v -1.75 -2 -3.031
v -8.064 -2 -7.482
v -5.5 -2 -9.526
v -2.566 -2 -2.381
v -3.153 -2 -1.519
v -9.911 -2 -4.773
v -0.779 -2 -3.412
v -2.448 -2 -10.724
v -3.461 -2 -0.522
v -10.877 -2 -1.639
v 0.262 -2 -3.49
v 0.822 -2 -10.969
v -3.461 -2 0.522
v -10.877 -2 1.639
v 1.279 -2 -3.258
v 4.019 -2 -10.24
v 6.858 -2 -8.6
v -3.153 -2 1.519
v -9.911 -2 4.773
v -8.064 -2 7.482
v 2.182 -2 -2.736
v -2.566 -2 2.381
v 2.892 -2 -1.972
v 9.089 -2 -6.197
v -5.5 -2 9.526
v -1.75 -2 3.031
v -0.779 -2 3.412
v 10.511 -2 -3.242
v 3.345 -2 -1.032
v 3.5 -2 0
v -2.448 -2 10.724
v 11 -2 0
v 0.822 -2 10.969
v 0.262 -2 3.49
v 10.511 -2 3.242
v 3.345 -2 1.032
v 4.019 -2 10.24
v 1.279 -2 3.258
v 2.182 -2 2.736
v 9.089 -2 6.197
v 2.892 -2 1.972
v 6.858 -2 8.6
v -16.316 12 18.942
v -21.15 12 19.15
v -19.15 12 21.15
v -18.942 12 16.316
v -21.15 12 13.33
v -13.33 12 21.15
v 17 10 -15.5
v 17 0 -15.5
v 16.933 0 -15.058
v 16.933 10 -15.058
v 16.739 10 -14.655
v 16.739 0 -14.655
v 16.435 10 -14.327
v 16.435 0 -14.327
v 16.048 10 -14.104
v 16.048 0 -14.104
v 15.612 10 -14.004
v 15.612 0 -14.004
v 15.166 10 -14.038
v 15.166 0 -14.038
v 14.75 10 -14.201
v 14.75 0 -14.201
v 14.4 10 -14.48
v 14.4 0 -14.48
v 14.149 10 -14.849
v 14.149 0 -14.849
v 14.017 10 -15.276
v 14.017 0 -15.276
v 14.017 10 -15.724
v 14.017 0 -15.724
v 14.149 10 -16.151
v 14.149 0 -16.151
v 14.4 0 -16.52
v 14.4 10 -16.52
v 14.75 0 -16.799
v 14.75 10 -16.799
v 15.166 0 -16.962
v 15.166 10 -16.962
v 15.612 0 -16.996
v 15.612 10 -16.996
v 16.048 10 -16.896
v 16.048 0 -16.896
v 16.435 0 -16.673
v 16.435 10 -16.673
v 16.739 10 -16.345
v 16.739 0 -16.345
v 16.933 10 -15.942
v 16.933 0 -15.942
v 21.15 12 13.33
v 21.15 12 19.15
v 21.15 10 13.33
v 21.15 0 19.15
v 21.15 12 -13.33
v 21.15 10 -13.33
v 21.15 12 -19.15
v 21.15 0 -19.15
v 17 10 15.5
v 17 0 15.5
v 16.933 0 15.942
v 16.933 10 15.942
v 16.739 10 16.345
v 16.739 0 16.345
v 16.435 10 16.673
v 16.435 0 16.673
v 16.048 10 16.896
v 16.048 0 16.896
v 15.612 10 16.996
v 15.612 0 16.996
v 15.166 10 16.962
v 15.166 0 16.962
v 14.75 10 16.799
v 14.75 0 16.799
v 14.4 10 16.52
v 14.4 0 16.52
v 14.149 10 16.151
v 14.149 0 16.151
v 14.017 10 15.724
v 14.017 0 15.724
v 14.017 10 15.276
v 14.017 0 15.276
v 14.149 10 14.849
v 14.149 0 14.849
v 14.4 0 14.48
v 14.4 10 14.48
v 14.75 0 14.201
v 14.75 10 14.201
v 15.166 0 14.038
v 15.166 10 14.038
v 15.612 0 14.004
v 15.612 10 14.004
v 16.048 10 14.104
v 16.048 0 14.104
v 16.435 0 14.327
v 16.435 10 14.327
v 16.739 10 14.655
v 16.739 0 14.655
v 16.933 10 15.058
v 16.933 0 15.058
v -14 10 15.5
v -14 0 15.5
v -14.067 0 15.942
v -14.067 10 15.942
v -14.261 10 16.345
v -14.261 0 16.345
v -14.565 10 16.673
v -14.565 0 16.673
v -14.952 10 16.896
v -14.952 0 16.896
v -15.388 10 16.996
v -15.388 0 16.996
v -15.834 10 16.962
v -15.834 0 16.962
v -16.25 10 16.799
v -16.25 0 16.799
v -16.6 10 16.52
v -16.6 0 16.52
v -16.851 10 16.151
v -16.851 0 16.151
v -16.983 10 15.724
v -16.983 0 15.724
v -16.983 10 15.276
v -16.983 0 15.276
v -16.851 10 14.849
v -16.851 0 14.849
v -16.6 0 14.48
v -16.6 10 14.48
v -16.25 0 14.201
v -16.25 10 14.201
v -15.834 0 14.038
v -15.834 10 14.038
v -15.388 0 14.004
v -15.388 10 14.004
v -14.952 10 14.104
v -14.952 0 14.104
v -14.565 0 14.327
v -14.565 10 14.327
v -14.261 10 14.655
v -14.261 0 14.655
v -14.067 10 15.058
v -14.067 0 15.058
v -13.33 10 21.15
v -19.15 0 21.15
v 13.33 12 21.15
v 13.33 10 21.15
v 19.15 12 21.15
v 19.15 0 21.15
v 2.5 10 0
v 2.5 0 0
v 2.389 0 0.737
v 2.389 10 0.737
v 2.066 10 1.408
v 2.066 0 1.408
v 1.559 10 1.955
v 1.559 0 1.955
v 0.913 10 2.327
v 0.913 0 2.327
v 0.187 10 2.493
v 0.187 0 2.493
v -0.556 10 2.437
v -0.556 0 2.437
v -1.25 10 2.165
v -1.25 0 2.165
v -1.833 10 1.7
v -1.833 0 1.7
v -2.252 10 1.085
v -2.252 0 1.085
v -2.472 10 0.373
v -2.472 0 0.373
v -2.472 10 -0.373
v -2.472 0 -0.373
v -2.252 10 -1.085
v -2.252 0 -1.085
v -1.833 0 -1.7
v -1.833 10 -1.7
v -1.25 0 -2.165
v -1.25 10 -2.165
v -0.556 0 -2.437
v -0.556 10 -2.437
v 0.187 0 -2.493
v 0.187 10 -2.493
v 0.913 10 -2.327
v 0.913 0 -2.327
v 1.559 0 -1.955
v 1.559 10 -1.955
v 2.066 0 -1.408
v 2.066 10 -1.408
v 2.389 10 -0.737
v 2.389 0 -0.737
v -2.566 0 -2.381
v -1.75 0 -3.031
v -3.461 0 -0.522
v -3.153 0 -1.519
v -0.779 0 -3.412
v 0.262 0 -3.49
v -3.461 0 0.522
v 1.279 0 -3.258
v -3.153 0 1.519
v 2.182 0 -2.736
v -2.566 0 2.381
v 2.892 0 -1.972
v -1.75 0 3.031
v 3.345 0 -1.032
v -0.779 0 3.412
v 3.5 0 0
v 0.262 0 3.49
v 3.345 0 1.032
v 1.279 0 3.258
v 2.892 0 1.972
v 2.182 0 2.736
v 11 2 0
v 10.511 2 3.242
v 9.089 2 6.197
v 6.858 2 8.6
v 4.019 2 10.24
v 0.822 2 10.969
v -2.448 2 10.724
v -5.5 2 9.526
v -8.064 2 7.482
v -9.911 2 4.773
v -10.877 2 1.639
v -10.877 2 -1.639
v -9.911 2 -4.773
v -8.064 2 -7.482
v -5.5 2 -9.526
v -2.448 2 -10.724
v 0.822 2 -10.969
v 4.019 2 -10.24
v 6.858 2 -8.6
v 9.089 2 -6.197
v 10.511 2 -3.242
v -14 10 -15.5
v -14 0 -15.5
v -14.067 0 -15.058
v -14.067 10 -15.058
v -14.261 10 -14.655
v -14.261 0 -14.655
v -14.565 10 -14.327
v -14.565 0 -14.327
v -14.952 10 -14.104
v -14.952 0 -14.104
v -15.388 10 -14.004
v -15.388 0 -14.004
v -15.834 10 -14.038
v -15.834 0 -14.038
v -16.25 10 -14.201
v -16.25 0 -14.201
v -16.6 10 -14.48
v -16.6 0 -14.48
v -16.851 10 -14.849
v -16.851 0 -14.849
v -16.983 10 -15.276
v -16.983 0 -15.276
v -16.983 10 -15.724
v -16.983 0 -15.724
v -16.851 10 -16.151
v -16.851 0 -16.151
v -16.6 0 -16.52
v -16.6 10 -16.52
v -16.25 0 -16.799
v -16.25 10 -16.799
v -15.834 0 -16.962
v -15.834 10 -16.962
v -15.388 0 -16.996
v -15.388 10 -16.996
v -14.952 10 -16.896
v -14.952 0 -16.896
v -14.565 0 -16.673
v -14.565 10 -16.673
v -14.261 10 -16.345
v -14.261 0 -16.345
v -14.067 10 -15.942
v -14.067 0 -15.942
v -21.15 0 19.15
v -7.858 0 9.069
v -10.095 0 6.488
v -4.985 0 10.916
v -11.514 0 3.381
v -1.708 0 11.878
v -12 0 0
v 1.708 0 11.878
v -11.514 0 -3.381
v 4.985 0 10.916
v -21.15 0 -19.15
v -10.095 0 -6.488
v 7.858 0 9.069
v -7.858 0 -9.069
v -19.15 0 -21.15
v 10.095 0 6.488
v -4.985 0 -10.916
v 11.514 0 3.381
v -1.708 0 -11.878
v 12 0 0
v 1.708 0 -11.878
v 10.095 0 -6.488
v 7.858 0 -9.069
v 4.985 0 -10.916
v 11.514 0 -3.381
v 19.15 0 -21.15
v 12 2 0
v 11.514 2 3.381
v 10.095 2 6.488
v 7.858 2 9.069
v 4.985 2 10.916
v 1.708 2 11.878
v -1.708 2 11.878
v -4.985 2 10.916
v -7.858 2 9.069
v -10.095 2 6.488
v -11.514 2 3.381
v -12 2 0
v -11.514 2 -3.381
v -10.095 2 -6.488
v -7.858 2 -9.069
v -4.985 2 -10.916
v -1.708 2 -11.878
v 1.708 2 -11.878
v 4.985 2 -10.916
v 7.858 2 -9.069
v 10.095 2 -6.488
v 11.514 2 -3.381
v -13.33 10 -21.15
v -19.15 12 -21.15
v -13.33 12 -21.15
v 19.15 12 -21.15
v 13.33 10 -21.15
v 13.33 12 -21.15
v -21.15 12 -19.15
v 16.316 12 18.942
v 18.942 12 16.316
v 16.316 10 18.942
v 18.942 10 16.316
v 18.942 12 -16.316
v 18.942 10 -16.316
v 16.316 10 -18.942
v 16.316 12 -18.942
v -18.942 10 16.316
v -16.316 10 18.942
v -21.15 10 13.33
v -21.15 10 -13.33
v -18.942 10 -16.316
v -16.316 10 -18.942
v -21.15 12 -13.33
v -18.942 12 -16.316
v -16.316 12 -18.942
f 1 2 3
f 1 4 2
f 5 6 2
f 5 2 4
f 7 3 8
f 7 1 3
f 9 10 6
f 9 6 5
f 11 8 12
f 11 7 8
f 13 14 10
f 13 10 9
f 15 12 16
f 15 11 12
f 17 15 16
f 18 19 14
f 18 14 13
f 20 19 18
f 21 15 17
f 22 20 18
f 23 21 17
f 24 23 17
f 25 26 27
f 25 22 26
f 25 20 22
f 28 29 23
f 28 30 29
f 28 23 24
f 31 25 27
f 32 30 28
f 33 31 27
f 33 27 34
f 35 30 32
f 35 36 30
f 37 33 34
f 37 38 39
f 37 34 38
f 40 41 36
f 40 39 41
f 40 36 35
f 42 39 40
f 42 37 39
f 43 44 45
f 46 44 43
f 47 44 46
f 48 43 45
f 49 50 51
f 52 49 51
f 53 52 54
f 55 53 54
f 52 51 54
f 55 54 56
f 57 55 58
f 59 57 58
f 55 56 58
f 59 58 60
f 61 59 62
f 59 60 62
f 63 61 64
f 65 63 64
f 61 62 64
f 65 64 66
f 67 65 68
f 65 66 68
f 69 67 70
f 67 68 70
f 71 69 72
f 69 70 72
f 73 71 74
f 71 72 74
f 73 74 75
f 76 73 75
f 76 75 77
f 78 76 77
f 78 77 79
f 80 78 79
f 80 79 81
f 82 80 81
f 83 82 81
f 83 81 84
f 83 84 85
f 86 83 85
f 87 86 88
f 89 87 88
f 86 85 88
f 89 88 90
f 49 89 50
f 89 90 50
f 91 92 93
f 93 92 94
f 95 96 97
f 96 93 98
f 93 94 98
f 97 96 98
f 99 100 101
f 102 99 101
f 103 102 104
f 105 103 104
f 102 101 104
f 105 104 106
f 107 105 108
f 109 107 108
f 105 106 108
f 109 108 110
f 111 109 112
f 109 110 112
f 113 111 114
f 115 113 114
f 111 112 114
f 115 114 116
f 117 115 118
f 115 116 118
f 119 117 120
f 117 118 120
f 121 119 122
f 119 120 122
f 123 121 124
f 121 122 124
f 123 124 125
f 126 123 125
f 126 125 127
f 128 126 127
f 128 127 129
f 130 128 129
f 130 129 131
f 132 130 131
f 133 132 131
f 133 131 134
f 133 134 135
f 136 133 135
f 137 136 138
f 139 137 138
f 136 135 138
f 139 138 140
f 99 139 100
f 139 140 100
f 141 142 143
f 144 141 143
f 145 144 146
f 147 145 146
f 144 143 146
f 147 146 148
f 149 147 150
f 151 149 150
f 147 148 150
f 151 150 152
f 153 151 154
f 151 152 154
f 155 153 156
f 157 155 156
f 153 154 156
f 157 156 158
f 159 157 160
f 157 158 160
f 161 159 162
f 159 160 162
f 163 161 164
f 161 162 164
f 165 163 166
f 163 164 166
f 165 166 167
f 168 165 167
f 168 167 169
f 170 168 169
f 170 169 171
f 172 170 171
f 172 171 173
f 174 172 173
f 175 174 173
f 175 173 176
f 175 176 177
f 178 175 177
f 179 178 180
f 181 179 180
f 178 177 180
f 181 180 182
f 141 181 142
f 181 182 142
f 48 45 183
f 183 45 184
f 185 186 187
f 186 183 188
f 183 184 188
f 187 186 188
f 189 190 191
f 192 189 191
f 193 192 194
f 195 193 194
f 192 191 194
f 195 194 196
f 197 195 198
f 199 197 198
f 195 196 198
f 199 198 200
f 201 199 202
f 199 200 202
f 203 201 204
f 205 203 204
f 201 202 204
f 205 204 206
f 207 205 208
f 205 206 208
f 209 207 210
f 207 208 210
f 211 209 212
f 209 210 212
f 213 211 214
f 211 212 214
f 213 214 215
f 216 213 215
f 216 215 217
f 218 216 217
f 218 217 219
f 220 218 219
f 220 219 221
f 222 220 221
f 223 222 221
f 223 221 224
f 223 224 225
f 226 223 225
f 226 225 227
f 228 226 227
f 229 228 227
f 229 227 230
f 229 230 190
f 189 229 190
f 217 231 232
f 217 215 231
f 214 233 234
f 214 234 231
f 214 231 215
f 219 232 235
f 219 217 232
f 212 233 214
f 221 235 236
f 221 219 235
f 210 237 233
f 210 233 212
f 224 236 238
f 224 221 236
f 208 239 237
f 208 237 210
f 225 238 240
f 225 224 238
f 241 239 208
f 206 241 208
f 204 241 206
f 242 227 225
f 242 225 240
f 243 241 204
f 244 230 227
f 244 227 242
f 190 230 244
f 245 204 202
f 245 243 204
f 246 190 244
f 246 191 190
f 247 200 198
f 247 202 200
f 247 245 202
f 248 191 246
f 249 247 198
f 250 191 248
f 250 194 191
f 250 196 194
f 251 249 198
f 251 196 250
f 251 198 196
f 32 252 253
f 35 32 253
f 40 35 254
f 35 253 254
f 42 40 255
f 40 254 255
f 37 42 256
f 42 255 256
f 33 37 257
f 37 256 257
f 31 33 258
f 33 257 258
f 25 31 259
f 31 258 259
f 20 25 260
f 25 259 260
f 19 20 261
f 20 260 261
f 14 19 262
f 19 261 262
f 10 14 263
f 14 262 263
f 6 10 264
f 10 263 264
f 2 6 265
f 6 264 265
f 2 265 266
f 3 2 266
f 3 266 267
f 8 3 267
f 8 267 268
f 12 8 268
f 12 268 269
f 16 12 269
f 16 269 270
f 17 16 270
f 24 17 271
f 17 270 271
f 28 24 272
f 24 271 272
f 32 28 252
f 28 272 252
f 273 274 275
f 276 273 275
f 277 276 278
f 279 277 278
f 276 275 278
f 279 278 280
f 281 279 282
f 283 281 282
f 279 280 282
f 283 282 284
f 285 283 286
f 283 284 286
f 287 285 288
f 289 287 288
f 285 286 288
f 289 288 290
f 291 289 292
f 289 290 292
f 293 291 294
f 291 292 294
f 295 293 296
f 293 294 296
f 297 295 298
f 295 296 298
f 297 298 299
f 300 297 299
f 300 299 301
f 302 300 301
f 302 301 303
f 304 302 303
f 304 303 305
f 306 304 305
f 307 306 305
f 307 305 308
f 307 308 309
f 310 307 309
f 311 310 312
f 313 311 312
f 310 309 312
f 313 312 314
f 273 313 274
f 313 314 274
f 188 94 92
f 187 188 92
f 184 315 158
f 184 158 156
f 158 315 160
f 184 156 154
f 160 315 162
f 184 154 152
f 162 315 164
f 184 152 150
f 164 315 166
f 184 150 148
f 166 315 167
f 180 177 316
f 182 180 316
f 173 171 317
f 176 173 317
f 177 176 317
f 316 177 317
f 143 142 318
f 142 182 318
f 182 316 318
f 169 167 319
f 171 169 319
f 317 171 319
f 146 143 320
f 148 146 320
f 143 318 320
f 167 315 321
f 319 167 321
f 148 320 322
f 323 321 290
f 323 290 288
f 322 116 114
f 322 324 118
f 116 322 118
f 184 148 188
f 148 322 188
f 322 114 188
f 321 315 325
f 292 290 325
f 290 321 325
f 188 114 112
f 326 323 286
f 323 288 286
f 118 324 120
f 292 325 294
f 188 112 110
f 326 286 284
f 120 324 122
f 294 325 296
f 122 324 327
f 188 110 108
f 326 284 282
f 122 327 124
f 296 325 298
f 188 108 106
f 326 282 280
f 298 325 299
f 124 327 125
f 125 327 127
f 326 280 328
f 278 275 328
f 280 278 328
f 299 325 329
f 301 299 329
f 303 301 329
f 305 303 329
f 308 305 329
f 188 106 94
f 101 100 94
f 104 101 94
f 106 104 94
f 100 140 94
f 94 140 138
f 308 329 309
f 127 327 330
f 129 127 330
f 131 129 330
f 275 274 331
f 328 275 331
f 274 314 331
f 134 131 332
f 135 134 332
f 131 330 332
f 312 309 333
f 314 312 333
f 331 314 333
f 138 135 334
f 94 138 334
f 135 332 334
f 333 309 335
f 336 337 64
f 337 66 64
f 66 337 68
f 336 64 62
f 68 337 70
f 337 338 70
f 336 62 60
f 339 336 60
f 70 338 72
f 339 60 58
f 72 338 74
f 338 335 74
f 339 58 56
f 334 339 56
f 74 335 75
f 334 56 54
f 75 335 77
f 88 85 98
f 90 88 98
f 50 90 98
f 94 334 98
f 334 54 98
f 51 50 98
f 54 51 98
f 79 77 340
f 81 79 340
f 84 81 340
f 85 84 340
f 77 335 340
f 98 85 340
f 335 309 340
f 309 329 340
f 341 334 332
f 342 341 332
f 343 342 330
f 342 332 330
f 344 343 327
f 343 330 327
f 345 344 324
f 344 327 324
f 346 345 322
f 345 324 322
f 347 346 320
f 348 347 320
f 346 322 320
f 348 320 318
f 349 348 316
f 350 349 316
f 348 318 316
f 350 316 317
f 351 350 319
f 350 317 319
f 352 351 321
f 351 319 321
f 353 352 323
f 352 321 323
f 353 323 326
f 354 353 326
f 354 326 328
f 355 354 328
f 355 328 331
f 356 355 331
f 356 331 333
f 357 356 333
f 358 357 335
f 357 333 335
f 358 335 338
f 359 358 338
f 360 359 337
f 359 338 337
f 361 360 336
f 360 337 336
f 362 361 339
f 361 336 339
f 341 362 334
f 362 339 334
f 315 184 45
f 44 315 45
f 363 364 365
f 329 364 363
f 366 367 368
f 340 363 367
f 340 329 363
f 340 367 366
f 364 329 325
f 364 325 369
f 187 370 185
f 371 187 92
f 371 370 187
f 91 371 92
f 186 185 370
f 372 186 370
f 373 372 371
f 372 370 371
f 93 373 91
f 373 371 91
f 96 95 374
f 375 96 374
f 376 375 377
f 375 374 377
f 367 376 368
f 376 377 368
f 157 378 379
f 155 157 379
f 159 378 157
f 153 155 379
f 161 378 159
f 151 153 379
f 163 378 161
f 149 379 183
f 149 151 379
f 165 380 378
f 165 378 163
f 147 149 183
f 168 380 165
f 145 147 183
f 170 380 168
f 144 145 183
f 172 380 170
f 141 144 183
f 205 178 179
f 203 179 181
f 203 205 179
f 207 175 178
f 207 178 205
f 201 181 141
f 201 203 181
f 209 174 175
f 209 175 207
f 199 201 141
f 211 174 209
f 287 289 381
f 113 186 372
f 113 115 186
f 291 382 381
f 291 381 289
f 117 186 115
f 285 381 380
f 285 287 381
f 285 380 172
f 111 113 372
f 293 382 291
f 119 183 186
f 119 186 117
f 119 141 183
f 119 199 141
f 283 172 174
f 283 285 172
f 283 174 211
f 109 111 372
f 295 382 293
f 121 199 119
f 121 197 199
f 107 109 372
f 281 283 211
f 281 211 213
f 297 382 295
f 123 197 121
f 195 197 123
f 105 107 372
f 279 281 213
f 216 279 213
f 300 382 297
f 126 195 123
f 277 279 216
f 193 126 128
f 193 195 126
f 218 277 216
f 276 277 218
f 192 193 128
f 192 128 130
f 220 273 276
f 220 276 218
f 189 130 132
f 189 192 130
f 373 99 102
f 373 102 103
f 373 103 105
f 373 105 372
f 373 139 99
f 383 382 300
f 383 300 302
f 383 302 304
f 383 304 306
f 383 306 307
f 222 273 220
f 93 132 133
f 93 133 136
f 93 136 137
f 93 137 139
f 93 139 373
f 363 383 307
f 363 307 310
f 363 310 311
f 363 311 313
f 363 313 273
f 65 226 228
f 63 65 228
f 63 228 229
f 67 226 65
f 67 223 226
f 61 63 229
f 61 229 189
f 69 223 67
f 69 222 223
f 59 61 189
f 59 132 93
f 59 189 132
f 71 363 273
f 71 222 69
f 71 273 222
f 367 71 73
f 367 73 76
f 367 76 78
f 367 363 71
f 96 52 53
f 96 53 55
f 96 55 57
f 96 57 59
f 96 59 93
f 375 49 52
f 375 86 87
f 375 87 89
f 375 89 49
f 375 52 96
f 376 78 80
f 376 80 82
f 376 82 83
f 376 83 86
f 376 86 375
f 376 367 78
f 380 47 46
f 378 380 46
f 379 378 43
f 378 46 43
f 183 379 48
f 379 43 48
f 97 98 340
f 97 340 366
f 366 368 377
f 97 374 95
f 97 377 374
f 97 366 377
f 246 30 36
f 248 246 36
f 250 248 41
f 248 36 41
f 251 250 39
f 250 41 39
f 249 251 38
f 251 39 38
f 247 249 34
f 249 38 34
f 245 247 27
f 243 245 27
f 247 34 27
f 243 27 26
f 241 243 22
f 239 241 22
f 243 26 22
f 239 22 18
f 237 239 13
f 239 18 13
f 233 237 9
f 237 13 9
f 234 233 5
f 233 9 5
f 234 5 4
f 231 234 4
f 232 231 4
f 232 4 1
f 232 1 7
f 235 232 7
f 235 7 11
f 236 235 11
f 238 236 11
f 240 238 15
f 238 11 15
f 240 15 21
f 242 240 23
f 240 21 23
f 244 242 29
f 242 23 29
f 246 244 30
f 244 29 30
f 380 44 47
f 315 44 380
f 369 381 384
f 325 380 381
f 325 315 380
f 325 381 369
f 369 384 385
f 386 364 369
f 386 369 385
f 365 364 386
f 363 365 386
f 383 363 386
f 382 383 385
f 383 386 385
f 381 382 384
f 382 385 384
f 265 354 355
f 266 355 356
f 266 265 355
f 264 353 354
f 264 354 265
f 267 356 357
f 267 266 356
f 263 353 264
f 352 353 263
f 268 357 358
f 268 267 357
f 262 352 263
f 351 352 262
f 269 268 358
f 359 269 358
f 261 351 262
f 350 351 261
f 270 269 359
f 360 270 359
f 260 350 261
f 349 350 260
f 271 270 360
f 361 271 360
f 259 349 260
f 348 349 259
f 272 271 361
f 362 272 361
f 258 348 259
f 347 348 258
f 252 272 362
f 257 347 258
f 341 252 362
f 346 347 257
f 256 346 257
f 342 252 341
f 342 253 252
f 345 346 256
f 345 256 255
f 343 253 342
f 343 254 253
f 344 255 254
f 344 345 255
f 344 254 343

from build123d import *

# Parameters (mm, degrees)
CROQUIS1_W              = 42.3
CROQUIS1_H              = 42.3
SALIENTE_EXTRUIR1_DEPTH = 12
CORTAR_EXTRUIR1_DEPTH   = 2
CHAFL_N1_SIZE           = 2
CROQUIS3_R              = 1.5
CORTAR_EXTRUIR2_DEPTH   = 10
CROQUIS4_R              = 12
CORTAR_EXTRUIR3_DEPTH   = 2
CROQUIS5_R              = 11
SALIENTE_EXTRUIR2_DEPTH = 4
CROQUIS6_R              = 3.5
CORTAR_EXTRUIR5_DEPTH   = 2
CROQUIS7_R              = 2.5
CORTAR_EXTRUIR6_DEPTH   = 13


with BuildPart() as part:
    # Croquis1 → Saliente-Extruir1 (new body)
    with BuildSketch(Plane(origin=(0, 0, 0), x_dir=(1, 0, 0), z_dir=(0, 1, 0))):
        Rectangle(CROQUIS1_W, CROQUIS1_H)
    extrude(amount=SALIENTE_EXTRUIR1_DEPTH)

    # Croquis2 → Cortar-Extruir1 (cut)
    with BuildSketch(Plane(origin=(0, 12, 0), x_dir=(1, 0, 0), z_dir=(0, 1, 0))):
        with BuildLine():
            Line((-21.15, 13.329572386), (-21.15, -13.329572386))
            ThreePointArc((-21.15, -13.329572386), (-17.67766953, -17.67766953), (-13.329572386, -21.15))
            Line((-13.329572386, -21.15), (13.329572386, -21.15))
            ThreePointArc((13.329572386, -21.15), (17.67766953, -17.67766953), (21.15, -13.329572386))
            Line((21.15, -13.329572386), (21.15, 13.329572386))
            ThreePointArc((21.15, 13.329572386), (17.67766953, 17.67766953), (13.329572386, 21.15))
            Line((13.329572386, 21.15), (-13.329572386, 21.15))
            ThreePointArc((-13.329572386, 21.15), (-17.67766953, 17.67766953), (-21.15, 13.329572386))
        make_face()
    extrude(amount=-CORTAR_EXTRUIR1_DEPTH, mode=Mode.SUBTRACT)

    # Chaflán1
    chafl_n1_edges = [part.edges().sort_by_distance(p)[0] for p in [
        (21.15, 6, 21.15),
        (-21.15, 6, 21.15),
        (-21.15, 6, -21.15),
        (21.15, 6, -21.15),
    ]]
    chamfer(chafl_n1_edges, length=CHAFL_N1_SIZE)

    # Croquis3 → Cortar-Extruir2 (cut)
    with BuildSketch(Plane.XZ):
        with Locations((-15.5, 15.5)):
            Circle(CROQUIS3_R)
        with Locations((-15.5, -15.5)):
            Circle(CROQUIS3_R)
        with Locations((15.5, -15.5)):
            Circle(CROQUIS3_R)
        with Locations((15.5, 15.5)):
            Circle(CROQUIS3_R)
    extrude(amount=-CORTAR_EXTRUIR2_DEPTH, mode=Mode.SUBTRACT)

    # Croquis4 → Cortar-Extruir3 (cut)
    with BuildSketch(Plane.XZ):
        Circle(CROQUIS4_R)
    extrude(amount=-CORTAR_EXTRUIR3_DEPTH, mode=Mode.SUBTRACT)

    # Croquis5 → Saliente-Extruir2 (add)
    with BuildSketch(Plane.XZ.offset(-2)):
        Circle(CROQUIS5_R)
    extrude(amount=SALIENTE_EXTRUIR2_DEPTH)

    # Croquis6 → Cortar-Extruir5 (cut)
    with BuildSketch(Plane.XZ.offset(2)):
        Circle(CROQUIS6_R)
    extrude(amount=-CORTAR_EXTRUIR5_DEPTH, mode=Mode.SUBTRACT)

    # Croquis7 → Cortar-Extruir6 (cut, through all)
    with BuildSketch(Plane.XZ):
        Circle(CROQUIS7_R)
    extrude(amount=-CORTAR_EXTRUIR6_DEPTH, mode=Mode.SUBTRACT)


solid = part.part
